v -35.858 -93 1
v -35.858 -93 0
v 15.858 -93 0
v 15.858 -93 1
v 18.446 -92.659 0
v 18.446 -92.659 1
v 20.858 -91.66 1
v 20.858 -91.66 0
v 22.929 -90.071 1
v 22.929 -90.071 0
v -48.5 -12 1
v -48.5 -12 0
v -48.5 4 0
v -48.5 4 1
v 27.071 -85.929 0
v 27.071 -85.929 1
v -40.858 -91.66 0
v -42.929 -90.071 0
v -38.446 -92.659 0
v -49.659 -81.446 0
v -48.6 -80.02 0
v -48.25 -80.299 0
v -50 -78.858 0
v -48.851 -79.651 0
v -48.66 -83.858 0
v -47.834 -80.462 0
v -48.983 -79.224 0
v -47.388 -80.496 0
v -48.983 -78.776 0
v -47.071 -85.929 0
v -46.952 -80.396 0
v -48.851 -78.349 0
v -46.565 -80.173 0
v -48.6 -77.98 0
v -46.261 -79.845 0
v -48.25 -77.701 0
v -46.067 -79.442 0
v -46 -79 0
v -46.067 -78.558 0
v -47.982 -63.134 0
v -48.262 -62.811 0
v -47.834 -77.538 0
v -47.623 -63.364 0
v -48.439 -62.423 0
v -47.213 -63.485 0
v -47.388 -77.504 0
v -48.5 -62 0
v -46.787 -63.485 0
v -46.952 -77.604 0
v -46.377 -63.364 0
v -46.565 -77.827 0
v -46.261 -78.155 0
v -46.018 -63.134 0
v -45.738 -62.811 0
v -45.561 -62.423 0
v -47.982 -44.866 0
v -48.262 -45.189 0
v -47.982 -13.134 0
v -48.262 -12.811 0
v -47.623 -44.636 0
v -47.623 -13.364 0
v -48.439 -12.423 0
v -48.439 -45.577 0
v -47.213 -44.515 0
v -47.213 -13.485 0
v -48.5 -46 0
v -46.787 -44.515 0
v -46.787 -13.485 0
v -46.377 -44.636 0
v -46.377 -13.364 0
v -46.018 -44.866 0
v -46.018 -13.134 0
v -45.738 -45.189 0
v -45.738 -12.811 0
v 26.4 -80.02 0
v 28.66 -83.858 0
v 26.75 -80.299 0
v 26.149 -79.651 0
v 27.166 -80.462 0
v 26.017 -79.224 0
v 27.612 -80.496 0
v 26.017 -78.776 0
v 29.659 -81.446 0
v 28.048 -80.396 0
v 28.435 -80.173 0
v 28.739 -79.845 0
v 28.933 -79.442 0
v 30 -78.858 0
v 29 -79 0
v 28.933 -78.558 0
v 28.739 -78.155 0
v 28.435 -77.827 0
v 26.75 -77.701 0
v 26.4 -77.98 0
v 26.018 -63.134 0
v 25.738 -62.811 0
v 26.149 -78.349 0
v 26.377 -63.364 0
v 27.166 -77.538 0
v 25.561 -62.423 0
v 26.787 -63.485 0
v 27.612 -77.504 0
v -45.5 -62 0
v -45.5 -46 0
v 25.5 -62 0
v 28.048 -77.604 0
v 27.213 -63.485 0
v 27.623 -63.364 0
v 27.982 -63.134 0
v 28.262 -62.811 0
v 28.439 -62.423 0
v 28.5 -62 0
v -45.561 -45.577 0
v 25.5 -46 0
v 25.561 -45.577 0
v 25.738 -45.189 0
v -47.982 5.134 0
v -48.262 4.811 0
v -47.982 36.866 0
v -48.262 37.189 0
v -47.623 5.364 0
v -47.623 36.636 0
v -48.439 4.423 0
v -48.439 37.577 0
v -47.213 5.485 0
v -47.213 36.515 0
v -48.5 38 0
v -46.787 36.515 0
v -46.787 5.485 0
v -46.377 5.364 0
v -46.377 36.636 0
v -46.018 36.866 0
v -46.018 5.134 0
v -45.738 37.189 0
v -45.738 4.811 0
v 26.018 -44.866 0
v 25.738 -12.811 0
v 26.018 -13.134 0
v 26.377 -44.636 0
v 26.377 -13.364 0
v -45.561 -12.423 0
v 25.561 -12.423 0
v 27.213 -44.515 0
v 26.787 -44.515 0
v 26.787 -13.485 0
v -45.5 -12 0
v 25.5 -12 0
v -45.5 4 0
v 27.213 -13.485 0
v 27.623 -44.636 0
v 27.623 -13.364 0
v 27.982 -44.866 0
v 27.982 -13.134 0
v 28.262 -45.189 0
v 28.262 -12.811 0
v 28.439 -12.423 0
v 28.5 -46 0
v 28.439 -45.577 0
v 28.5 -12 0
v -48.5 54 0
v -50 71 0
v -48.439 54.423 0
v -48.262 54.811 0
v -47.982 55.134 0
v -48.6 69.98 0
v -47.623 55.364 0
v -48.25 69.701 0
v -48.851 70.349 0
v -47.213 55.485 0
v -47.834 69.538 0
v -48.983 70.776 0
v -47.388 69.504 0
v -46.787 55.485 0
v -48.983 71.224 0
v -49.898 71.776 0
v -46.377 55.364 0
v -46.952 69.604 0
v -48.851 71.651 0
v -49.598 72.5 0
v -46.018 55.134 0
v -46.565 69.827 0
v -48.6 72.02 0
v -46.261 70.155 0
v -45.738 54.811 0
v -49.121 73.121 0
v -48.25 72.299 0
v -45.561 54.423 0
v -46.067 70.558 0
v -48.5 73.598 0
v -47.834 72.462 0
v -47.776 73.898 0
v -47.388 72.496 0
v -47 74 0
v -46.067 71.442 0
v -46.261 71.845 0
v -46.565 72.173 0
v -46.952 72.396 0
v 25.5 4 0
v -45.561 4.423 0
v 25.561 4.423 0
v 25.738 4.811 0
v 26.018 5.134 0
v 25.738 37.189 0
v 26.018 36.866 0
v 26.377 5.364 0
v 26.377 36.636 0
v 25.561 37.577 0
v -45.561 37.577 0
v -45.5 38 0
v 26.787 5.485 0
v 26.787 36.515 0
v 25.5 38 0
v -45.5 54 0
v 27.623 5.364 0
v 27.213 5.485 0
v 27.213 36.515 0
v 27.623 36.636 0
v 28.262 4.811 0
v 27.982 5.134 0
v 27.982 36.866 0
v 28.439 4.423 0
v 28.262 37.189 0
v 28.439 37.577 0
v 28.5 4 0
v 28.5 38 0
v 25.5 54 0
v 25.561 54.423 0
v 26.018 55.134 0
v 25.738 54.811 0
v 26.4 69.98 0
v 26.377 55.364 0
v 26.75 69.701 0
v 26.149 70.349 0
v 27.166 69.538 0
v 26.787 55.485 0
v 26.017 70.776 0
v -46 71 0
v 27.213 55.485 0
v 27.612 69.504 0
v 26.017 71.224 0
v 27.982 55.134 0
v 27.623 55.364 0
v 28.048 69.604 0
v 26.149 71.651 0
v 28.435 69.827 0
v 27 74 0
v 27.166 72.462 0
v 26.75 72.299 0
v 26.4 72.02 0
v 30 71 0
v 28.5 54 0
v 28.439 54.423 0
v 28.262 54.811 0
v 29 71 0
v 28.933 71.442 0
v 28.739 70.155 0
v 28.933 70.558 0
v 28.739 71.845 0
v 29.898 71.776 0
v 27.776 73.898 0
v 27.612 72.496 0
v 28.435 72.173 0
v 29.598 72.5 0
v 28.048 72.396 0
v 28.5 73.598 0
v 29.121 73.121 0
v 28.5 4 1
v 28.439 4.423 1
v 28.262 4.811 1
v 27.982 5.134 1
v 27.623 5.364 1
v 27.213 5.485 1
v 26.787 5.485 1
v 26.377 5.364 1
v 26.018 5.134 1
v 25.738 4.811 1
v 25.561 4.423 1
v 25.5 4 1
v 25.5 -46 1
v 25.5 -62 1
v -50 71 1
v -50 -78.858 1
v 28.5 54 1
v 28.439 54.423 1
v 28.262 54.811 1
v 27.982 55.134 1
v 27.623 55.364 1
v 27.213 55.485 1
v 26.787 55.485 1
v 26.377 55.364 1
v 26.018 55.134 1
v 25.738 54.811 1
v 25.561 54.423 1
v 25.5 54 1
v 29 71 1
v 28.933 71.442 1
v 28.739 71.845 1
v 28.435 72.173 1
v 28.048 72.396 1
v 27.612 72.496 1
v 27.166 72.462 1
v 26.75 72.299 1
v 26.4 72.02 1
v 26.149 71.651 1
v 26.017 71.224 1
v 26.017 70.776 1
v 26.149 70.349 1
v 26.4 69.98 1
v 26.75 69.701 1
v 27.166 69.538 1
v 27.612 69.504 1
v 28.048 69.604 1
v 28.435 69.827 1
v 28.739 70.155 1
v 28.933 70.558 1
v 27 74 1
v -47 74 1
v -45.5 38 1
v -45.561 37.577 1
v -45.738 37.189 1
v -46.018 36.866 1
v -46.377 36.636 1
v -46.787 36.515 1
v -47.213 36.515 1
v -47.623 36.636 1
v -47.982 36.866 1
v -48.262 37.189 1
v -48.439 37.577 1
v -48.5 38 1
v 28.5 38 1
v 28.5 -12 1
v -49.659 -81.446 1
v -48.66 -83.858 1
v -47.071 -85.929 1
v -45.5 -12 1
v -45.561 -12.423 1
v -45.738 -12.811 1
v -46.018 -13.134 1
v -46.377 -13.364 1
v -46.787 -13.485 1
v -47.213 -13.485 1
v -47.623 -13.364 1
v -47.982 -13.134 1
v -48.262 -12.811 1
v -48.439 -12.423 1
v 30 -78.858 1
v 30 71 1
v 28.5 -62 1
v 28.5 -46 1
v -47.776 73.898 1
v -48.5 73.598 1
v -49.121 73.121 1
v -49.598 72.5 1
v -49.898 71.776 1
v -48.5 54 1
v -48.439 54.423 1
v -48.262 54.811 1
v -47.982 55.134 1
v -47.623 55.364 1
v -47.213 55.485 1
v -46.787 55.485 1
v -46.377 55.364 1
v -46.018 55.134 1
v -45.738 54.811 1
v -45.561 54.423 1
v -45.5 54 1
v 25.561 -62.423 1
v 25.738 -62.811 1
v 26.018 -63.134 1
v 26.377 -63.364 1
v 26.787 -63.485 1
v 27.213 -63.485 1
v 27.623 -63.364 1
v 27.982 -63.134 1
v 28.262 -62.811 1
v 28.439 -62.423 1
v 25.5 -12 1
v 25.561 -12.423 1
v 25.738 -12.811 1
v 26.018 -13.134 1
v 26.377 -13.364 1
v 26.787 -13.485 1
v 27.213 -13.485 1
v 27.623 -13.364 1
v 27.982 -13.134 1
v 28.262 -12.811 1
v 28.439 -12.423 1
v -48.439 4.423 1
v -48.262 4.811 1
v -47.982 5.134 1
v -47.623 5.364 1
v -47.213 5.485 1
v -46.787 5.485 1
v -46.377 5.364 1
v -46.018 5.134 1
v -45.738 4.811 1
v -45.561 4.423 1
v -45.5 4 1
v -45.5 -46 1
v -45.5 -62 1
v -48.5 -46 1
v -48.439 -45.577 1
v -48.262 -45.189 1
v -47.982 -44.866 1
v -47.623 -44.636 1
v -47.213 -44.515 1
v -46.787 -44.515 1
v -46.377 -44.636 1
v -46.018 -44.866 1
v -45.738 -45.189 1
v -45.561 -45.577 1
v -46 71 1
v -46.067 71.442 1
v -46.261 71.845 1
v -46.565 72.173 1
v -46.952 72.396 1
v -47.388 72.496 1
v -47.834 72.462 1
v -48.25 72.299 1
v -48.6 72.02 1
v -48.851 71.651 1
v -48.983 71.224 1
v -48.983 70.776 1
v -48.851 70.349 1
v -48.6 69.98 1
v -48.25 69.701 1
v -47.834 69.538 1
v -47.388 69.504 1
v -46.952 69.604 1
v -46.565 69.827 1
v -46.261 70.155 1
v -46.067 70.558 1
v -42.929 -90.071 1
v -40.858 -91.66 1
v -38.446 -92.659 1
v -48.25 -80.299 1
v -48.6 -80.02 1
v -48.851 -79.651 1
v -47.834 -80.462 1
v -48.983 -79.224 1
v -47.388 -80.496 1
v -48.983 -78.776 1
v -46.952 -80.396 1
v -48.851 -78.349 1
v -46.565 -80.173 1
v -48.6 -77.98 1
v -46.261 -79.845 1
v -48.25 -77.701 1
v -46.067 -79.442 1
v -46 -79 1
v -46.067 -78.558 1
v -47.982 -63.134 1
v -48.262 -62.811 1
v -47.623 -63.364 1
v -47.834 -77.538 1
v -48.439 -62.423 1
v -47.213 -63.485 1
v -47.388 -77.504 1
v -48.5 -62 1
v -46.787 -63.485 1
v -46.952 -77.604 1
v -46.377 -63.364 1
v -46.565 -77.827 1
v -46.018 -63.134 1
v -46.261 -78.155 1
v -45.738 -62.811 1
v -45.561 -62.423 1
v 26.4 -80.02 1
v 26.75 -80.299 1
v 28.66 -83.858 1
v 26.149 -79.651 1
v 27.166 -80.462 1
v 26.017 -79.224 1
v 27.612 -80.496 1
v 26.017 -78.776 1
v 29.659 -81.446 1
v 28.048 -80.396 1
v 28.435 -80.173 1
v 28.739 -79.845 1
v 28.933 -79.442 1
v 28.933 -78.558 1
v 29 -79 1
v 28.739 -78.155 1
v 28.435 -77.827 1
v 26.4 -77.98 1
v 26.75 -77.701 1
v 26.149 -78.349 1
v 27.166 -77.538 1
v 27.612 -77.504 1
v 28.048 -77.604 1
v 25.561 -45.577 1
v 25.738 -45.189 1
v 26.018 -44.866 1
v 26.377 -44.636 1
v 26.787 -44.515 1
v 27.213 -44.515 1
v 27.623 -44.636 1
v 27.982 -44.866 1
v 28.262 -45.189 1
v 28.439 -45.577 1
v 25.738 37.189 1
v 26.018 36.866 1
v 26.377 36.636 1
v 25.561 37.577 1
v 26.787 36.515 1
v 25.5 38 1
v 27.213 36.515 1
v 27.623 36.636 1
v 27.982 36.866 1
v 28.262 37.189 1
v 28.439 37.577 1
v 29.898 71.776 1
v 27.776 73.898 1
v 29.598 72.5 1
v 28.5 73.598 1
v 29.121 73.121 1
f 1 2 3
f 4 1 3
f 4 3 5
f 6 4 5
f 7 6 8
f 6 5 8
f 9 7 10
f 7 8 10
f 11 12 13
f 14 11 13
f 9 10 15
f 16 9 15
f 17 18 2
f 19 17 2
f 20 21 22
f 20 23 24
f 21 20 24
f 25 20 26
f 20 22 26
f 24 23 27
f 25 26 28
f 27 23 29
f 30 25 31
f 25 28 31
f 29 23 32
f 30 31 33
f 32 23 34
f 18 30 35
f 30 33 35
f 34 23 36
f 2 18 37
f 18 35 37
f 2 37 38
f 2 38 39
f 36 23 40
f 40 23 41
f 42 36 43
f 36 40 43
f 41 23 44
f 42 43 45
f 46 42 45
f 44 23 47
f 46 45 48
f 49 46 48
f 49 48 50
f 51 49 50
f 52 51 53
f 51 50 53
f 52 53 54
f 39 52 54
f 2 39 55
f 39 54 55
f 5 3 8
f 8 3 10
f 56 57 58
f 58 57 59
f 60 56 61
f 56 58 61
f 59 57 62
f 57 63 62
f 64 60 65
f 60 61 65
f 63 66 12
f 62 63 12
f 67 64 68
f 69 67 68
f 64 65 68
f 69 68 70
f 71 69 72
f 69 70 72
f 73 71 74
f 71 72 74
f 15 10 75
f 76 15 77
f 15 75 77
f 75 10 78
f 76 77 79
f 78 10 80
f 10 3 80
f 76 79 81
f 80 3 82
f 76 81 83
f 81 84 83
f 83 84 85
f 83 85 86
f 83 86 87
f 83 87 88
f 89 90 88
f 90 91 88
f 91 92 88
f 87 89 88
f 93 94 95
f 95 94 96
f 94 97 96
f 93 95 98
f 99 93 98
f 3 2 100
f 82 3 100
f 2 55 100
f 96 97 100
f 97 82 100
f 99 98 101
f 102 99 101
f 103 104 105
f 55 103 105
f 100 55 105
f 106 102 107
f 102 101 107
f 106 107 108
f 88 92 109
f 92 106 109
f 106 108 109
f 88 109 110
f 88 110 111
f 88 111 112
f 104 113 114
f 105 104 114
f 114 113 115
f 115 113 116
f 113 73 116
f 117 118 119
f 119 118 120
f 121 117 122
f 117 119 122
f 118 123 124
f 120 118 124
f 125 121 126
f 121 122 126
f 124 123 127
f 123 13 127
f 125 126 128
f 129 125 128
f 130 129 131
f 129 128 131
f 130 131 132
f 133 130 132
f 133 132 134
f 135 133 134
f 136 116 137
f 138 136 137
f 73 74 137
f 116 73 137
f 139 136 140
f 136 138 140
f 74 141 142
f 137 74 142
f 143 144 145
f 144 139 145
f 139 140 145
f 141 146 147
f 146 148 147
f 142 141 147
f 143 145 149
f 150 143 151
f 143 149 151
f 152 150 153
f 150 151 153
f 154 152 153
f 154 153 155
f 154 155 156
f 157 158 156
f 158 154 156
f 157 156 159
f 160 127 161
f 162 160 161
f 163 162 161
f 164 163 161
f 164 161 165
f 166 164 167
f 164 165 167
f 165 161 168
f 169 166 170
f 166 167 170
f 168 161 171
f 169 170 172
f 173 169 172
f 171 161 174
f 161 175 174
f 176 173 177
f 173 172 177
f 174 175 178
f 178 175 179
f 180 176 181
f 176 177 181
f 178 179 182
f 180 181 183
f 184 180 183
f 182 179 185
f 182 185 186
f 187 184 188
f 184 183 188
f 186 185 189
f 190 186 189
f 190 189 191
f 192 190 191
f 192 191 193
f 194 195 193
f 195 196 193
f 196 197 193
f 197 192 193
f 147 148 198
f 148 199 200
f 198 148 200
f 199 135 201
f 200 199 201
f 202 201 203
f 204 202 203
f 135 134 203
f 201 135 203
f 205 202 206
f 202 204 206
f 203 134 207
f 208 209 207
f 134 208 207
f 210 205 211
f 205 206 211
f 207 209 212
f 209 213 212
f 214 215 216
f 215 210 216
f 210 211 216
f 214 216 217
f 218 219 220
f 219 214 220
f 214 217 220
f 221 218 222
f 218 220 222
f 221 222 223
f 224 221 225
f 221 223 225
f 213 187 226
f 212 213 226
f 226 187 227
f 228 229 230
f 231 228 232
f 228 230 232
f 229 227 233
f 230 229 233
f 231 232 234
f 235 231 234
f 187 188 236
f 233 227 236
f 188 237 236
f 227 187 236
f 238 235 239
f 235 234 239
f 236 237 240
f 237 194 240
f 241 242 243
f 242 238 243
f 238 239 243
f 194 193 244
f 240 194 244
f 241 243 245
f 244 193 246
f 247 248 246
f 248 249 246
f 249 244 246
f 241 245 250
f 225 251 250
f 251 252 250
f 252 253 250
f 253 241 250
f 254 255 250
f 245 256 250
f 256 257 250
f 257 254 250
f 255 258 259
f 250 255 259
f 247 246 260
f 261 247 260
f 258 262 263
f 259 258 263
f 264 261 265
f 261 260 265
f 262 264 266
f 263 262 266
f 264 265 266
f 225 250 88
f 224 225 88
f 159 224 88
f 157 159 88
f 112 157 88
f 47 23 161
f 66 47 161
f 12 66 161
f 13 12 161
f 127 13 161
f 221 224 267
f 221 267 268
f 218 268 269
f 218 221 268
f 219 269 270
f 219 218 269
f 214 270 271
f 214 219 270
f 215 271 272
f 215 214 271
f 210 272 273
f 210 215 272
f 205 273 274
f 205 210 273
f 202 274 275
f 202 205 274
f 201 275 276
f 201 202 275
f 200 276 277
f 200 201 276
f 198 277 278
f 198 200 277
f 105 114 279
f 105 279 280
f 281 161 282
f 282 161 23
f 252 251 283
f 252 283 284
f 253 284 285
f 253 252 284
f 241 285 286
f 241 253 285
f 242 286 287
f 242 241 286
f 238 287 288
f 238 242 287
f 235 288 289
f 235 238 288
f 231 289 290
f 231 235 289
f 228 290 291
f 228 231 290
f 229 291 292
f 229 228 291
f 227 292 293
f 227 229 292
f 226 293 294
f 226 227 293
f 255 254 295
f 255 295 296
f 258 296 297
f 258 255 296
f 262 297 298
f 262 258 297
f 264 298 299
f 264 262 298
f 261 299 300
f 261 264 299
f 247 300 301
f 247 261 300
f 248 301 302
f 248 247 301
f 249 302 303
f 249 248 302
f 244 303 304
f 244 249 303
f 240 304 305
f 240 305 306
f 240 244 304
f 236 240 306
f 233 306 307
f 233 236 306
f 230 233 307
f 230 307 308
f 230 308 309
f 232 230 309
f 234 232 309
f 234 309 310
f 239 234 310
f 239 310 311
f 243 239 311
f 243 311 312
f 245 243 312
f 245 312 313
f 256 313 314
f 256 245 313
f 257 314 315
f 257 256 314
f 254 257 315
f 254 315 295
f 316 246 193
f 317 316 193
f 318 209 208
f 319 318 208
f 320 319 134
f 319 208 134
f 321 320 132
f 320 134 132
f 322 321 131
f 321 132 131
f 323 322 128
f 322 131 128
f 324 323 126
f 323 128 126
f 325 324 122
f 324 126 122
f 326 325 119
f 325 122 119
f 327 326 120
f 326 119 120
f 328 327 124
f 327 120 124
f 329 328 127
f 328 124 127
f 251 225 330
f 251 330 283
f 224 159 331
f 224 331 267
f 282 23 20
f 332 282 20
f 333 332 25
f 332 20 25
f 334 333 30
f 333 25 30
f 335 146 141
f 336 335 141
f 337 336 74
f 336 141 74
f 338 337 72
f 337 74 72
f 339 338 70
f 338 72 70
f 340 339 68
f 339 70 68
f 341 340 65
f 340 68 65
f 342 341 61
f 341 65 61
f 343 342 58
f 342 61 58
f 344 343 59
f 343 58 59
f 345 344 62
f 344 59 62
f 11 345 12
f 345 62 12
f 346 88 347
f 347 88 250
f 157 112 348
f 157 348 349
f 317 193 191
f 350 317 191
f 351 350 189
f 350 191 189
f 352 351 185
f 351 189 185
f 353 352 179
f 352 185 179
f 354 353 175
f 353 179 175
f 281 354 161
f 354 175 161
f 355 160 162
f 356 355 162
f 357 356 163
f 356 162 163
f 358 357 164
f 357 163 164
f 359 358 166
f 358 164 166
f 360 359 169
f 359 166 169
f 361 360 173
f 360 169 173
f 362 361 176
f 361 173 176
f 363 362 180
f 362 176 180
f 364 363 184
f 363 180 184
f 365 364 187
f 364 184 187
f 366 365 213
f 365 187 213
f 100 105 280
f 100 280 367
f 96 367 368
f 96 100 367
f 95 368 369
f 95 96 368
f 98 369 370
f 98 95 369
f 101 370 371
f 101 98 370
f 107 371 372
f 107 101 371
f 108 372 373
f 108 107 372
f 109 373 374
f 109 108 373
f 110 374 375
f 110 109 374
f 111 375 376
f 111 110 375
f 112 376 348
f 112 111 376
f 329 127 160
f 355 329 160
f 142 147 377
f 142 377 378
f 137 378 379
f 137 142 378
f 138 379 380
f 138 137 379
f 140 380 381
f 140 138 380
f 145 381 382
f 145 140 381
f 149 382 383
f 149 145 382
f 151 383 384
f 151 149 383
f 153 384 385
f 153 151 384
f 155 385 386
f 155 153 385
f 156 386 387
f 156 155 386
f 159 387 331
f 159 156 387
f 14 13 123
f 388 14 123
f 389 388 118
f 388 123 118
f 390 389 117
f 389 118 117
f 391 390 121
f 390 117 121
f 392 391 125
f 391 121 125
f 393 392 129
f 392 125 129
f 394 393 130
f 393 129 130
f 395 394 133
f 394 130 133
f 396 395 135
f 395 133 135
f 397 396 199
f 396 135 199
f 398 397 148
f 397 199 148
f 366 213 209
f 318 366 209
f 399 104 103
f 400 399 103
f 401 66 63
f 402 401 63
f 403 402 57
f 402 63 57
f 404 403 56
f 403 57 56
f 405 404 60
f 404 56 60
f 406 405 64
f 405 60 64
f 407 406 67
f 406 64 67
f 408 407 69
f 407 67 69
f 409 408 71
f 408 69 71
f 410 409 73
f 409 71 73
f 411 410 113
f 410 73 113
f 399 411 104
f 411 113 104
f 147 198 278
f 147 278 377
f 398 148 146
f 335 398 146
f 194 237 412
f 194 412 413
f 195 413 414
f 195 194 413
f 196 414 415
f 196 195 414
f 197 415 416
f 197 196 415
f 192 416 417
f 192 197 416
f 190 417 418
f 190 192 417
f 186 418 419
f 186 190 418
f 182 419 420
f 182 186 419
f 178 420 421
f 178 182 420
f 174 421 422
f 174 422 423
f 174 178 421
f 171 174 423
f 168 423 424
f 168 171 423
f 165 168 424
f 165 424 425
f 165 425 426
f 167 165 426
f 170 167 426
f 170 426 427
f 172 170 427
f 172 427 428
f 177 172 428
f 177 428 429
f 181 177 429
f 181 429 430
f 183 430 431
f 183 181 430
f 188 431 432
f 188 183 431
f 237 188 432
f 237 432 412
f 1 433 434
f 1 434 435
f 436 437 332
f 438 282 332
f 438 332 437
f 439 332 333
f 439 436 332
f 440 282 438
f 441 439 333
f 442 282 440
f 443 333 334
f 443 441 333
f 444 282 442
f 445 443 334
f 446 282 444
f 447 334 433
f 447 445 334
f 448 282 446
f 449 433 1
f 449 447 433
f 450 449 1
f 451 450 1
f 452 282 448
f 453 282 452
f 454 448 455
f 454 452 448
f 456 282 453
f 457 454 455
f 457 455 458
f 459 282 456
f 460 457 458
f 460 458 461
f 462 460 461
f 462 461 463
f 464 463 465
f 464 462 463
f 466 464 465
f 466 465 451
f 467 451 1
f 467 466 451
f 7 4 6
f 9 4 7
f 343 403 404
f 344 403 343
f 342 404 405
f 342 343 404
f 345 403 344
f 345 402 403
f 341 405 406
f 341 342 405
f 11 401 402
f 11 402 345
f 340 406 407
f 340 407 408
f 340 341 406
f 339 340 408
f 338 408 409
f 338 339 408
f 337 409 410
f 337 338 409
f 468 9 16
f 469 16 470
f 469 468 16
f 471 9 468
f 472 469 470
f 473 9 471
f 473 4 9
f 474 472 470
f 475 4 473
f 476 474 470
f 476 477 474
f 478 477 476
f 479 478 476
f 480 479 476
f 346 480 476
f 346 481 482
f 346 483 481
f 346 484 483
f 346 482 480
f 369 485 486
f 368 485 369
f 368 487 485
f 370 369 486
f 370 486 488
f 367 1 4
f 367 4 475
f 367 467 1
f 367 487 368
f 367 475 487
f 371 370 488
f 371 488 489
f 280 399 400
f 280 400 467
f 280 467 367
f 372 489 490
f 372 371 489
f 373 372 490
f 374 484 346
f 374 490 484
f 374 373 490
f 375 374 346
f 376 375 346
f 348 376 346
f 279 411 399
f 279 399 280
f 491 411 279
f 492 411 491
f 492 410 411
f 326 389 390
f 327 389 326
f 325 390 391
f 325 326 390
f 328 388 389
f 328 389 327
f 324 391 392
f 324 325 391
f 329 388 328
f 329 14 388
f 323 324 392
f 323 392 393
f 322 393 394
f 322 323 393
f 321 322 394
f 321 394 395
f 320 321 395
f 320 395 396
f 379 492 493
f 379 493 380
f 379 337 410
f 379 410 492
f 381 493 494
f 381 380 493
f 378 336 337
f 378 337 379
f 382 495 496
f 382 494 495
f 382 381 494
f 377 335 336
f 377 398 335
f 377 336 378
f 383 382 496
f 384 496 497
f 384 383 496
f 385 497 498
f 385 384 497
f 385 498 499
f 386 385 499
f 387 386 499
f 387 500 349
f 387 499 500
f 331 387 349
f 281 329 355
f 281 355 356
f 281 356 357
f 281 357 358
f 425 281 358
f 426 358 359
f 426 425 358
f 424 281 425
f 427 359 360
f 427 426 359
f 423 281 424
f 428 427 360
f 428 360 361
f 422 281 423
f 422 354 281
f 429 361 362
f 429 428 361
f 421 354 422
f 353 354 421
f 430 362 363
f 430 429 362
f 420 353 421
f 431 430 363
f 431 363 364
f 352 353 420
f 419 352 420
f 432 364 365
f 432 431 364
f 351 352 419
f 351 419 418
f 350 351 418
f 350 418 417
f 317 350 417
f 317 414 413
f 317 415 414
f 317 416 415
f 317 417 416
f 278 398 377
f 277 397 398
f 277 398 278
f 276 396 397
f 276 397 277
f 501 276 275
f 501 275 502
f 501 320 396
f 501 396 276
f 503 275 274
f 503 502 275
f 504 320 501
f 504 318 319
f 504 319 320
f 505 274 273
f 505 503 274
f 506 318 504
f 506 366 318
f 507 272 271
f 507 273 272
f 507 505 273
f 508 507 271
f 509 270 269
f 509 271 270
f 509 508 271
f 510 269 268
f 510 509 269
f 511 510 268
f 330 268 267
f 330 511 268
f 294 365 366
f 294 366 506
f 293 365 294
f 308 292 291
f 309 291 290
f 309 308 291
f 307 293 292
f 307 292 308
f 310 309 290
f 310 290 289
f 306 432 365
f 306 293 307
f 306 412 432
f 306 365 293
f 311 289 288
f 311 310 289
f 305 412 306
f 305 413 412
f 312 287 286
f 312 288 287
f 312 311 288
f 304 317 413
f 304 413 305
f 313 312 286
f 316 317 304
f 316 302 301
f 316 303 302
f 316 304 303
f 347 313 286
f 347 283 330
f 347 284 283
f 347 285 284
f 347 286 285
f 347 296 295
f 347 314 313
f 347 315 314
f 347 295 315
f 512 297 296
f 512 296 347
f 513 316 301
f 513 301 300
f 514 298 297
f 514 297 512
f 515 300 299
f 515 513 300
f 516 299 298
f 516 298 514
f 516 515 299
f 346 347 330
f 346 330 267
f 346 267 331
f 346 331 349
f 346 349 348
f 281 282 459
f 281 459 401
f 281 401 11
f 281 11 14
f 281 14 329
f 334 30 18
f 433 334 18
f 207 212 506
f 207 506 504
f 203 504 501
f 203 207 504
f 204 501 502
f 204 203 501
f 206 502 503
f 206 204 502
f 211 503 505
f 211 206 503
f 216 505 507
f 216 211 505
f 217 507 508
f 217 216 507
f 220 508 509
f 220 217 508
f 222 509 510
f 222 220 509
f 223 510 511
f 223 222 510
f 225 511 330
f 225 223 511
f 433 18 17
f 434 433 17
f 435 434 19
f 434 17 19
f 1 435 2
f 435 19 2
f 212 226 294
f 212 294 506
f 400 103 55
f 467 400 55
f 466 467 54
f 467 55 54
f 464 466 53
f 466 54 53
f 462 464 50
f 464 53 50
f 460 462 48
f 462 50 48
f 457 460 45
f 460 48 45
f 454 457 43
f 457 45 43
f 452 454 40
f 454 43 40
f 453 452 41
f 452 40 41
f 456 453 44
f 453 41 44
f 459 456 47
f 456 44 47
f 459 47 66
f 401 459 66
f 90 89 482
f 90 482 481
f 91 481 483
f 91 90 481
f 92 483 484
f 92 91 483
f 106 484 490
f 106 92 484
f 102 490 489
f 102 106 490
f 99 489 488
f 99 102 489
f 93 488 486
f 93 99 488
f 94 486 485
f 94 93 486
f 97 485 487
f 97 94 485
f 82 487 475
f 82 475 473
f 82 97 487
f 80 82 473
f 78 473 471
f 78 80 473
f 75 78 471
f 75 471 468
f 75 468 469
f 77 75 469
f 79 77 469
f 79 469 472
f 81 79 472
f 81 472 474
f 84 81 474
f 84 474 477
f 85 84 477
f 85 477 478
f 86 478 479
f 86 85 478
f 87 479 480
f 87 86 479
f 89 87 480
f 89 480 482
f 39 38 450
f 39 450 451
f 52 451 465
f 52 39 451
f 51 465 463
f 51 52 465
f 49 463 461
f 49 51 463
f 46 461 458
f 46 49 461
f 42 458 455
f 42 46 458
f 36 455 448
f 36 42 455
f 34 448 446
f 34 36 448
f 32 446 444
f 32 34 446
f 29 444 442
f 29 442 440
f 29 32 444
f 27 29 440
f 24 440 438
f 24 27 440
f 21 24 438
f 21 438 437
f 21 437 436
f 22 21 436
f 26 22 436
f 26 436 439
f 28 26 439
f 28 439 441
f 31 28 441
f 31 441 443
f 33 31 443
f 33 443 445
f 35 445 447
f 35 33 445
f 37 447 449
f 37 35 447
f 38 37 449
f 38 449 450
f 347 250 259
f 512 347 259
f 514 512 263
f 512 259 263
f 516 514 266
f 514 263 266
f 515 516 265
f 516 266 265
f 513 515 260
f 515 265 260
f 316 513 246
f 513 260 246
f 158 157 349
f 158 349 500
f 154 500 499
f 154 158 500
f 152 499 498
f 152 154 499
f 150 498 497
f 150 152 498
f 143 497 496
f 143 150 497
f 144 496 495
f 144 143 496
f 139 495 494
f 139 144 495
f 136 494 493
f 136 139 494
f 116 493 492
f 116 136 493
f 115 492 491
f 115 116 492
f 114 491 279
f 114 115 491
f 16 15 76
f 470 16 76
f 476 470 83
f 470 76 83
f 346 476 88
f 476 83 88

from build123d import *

# Parameters (mm, degrees)
SKETCH2_R           = 1.5
BOSS_EXTRUDE1_DEPTH = 1


with BuildPart() as part:
    # Sketch2 → Boss-Extrude1 (new body)
    with BuildSketch(Plane.XY):
        with BuildLine():
            Line((-35.857864376, -93), (15.857864376, -93))
            ThreePointArc((15.857864376, -93), (19.6846987, -92.238795325), (22.928932188, -90.071067812))
            Line((22.928932188, -90.071067812), (27.071067812, -85.928932188))
            ThreePointArc((27.071067812, -85.928932188), (29.238795325, -82.6846987), (30, -78.857864376))
            Line((30, -78.857864376), (30, 71))
            ThreePointArc((30, 71), (29.121320344, 73.121320344), (27, 74))
            Line((27, 74), (-47, 74))
            ThreePointArc((-47, 74), (-49.121320344, 73.121320344), (-50, 71))
            Line((-50, 71), (-50, -78.857864376))
            ThreePointArc((-50, -78.857864376), (-49.238795325, -82.6846987), (-47.071067812, -85.928932188))
            Line((-47.071067812, -85.928932188), (-42.928932188, -90.071067812))
            ThreePointArc((-42.928932188, -90.071067812), (-39.6846987, -92.238795325), (-35.857864376, -93))
        make_face()
        with Locations((-47.5, 71)):
            Circle(SKETCH2_R, mode=Mode.SUBTRACT)
        with Locations((27.5, 71)):
            Circle(SKETCH2_R, mode=Mode.SUBTRACT)
        with Locations((-47.5, -79)):
            Circle(SKETCH2_R, mode=Mode.SUBTRACT)
        with Locations((27.5, -79)):
            Circle(SKETCH2_R, mode=Mode.SUBTRACT)
        with BuildLine():
            Line((-48.5, -12), (-48.5, 4))
            ThreePointArc((-48.5, 4), (-47, 5.5), (-45.5, 4))
            Line((-45.5, 4), (-45.5, -12))
            ThreePointArc((-45.5, -12), (-47, -13.5), (-48.5, -12))
        make_face(mode=Mode.SUBTRACT)
        with BuildLine():
            Line((28.5, -12), (28.5, 4))
            ThreePointArc((28.5, 4), (27, 5.5), (25.5, 4))
            Line((25.5, 4), (25.5, -12))
            ThreePointArc((25.5, -12), (27, -13.5), (28.5, -12))
        make_face(mode=Mode.SUBTRACT)
        with BuildLine():
            Line((-48.5, 38), (-48.5, 54))
            ThreePointArc((-48.5, 54), (-47, 55.5), (-45.5, 54))
            Line((-45.5, 54), (-45.5, 38))
            ThreePointArc((-45.5, 38), (-47, 36.5), (-48.5, 38))
        make_face(mode=Mode.SUBTRACT)
        with BuildLine():
            Line((-45.5, -46), (-45.5, -62))
            ThreePointArc((-45.5, -62), (-47, -63.5), (-48.5, -62))
            Line((-48.5, -62), (-48.5, -46))
            ThreePointArc((-48.5, -46), (-47, -44.5), (-45.5, -46))
        make_face(mode=Mode.SUBTRACT)
        with BuildLine():
            Line((28.5, 38), (28.5, 54))
            ThreePointArc((28.5, 54), (27, 55.5), (25.5, 54))
            Line((25.5, 54), (25.5, 38))
            ThreePointArc((25.5, 38), (27, 36.5), (28.5, 38))
        make_face(mode=Mode.SUBTRACT)
        with BuildLine():
            Line((25.5, -46), (25.5, -62))
            ThreePointArc((25.5, -62), (27, -63.5), (28.5, -62))
            Line((28.5, -62), (28.5, -46))
            ThreePointArc((28.5, -46), (27, -44.5), (25.5, -46))
        make_face(mode=Mode.SUBTRACT)
    extrude(amount=BOSS_EXTRUDE1_DEPTH)


solid = part.part
